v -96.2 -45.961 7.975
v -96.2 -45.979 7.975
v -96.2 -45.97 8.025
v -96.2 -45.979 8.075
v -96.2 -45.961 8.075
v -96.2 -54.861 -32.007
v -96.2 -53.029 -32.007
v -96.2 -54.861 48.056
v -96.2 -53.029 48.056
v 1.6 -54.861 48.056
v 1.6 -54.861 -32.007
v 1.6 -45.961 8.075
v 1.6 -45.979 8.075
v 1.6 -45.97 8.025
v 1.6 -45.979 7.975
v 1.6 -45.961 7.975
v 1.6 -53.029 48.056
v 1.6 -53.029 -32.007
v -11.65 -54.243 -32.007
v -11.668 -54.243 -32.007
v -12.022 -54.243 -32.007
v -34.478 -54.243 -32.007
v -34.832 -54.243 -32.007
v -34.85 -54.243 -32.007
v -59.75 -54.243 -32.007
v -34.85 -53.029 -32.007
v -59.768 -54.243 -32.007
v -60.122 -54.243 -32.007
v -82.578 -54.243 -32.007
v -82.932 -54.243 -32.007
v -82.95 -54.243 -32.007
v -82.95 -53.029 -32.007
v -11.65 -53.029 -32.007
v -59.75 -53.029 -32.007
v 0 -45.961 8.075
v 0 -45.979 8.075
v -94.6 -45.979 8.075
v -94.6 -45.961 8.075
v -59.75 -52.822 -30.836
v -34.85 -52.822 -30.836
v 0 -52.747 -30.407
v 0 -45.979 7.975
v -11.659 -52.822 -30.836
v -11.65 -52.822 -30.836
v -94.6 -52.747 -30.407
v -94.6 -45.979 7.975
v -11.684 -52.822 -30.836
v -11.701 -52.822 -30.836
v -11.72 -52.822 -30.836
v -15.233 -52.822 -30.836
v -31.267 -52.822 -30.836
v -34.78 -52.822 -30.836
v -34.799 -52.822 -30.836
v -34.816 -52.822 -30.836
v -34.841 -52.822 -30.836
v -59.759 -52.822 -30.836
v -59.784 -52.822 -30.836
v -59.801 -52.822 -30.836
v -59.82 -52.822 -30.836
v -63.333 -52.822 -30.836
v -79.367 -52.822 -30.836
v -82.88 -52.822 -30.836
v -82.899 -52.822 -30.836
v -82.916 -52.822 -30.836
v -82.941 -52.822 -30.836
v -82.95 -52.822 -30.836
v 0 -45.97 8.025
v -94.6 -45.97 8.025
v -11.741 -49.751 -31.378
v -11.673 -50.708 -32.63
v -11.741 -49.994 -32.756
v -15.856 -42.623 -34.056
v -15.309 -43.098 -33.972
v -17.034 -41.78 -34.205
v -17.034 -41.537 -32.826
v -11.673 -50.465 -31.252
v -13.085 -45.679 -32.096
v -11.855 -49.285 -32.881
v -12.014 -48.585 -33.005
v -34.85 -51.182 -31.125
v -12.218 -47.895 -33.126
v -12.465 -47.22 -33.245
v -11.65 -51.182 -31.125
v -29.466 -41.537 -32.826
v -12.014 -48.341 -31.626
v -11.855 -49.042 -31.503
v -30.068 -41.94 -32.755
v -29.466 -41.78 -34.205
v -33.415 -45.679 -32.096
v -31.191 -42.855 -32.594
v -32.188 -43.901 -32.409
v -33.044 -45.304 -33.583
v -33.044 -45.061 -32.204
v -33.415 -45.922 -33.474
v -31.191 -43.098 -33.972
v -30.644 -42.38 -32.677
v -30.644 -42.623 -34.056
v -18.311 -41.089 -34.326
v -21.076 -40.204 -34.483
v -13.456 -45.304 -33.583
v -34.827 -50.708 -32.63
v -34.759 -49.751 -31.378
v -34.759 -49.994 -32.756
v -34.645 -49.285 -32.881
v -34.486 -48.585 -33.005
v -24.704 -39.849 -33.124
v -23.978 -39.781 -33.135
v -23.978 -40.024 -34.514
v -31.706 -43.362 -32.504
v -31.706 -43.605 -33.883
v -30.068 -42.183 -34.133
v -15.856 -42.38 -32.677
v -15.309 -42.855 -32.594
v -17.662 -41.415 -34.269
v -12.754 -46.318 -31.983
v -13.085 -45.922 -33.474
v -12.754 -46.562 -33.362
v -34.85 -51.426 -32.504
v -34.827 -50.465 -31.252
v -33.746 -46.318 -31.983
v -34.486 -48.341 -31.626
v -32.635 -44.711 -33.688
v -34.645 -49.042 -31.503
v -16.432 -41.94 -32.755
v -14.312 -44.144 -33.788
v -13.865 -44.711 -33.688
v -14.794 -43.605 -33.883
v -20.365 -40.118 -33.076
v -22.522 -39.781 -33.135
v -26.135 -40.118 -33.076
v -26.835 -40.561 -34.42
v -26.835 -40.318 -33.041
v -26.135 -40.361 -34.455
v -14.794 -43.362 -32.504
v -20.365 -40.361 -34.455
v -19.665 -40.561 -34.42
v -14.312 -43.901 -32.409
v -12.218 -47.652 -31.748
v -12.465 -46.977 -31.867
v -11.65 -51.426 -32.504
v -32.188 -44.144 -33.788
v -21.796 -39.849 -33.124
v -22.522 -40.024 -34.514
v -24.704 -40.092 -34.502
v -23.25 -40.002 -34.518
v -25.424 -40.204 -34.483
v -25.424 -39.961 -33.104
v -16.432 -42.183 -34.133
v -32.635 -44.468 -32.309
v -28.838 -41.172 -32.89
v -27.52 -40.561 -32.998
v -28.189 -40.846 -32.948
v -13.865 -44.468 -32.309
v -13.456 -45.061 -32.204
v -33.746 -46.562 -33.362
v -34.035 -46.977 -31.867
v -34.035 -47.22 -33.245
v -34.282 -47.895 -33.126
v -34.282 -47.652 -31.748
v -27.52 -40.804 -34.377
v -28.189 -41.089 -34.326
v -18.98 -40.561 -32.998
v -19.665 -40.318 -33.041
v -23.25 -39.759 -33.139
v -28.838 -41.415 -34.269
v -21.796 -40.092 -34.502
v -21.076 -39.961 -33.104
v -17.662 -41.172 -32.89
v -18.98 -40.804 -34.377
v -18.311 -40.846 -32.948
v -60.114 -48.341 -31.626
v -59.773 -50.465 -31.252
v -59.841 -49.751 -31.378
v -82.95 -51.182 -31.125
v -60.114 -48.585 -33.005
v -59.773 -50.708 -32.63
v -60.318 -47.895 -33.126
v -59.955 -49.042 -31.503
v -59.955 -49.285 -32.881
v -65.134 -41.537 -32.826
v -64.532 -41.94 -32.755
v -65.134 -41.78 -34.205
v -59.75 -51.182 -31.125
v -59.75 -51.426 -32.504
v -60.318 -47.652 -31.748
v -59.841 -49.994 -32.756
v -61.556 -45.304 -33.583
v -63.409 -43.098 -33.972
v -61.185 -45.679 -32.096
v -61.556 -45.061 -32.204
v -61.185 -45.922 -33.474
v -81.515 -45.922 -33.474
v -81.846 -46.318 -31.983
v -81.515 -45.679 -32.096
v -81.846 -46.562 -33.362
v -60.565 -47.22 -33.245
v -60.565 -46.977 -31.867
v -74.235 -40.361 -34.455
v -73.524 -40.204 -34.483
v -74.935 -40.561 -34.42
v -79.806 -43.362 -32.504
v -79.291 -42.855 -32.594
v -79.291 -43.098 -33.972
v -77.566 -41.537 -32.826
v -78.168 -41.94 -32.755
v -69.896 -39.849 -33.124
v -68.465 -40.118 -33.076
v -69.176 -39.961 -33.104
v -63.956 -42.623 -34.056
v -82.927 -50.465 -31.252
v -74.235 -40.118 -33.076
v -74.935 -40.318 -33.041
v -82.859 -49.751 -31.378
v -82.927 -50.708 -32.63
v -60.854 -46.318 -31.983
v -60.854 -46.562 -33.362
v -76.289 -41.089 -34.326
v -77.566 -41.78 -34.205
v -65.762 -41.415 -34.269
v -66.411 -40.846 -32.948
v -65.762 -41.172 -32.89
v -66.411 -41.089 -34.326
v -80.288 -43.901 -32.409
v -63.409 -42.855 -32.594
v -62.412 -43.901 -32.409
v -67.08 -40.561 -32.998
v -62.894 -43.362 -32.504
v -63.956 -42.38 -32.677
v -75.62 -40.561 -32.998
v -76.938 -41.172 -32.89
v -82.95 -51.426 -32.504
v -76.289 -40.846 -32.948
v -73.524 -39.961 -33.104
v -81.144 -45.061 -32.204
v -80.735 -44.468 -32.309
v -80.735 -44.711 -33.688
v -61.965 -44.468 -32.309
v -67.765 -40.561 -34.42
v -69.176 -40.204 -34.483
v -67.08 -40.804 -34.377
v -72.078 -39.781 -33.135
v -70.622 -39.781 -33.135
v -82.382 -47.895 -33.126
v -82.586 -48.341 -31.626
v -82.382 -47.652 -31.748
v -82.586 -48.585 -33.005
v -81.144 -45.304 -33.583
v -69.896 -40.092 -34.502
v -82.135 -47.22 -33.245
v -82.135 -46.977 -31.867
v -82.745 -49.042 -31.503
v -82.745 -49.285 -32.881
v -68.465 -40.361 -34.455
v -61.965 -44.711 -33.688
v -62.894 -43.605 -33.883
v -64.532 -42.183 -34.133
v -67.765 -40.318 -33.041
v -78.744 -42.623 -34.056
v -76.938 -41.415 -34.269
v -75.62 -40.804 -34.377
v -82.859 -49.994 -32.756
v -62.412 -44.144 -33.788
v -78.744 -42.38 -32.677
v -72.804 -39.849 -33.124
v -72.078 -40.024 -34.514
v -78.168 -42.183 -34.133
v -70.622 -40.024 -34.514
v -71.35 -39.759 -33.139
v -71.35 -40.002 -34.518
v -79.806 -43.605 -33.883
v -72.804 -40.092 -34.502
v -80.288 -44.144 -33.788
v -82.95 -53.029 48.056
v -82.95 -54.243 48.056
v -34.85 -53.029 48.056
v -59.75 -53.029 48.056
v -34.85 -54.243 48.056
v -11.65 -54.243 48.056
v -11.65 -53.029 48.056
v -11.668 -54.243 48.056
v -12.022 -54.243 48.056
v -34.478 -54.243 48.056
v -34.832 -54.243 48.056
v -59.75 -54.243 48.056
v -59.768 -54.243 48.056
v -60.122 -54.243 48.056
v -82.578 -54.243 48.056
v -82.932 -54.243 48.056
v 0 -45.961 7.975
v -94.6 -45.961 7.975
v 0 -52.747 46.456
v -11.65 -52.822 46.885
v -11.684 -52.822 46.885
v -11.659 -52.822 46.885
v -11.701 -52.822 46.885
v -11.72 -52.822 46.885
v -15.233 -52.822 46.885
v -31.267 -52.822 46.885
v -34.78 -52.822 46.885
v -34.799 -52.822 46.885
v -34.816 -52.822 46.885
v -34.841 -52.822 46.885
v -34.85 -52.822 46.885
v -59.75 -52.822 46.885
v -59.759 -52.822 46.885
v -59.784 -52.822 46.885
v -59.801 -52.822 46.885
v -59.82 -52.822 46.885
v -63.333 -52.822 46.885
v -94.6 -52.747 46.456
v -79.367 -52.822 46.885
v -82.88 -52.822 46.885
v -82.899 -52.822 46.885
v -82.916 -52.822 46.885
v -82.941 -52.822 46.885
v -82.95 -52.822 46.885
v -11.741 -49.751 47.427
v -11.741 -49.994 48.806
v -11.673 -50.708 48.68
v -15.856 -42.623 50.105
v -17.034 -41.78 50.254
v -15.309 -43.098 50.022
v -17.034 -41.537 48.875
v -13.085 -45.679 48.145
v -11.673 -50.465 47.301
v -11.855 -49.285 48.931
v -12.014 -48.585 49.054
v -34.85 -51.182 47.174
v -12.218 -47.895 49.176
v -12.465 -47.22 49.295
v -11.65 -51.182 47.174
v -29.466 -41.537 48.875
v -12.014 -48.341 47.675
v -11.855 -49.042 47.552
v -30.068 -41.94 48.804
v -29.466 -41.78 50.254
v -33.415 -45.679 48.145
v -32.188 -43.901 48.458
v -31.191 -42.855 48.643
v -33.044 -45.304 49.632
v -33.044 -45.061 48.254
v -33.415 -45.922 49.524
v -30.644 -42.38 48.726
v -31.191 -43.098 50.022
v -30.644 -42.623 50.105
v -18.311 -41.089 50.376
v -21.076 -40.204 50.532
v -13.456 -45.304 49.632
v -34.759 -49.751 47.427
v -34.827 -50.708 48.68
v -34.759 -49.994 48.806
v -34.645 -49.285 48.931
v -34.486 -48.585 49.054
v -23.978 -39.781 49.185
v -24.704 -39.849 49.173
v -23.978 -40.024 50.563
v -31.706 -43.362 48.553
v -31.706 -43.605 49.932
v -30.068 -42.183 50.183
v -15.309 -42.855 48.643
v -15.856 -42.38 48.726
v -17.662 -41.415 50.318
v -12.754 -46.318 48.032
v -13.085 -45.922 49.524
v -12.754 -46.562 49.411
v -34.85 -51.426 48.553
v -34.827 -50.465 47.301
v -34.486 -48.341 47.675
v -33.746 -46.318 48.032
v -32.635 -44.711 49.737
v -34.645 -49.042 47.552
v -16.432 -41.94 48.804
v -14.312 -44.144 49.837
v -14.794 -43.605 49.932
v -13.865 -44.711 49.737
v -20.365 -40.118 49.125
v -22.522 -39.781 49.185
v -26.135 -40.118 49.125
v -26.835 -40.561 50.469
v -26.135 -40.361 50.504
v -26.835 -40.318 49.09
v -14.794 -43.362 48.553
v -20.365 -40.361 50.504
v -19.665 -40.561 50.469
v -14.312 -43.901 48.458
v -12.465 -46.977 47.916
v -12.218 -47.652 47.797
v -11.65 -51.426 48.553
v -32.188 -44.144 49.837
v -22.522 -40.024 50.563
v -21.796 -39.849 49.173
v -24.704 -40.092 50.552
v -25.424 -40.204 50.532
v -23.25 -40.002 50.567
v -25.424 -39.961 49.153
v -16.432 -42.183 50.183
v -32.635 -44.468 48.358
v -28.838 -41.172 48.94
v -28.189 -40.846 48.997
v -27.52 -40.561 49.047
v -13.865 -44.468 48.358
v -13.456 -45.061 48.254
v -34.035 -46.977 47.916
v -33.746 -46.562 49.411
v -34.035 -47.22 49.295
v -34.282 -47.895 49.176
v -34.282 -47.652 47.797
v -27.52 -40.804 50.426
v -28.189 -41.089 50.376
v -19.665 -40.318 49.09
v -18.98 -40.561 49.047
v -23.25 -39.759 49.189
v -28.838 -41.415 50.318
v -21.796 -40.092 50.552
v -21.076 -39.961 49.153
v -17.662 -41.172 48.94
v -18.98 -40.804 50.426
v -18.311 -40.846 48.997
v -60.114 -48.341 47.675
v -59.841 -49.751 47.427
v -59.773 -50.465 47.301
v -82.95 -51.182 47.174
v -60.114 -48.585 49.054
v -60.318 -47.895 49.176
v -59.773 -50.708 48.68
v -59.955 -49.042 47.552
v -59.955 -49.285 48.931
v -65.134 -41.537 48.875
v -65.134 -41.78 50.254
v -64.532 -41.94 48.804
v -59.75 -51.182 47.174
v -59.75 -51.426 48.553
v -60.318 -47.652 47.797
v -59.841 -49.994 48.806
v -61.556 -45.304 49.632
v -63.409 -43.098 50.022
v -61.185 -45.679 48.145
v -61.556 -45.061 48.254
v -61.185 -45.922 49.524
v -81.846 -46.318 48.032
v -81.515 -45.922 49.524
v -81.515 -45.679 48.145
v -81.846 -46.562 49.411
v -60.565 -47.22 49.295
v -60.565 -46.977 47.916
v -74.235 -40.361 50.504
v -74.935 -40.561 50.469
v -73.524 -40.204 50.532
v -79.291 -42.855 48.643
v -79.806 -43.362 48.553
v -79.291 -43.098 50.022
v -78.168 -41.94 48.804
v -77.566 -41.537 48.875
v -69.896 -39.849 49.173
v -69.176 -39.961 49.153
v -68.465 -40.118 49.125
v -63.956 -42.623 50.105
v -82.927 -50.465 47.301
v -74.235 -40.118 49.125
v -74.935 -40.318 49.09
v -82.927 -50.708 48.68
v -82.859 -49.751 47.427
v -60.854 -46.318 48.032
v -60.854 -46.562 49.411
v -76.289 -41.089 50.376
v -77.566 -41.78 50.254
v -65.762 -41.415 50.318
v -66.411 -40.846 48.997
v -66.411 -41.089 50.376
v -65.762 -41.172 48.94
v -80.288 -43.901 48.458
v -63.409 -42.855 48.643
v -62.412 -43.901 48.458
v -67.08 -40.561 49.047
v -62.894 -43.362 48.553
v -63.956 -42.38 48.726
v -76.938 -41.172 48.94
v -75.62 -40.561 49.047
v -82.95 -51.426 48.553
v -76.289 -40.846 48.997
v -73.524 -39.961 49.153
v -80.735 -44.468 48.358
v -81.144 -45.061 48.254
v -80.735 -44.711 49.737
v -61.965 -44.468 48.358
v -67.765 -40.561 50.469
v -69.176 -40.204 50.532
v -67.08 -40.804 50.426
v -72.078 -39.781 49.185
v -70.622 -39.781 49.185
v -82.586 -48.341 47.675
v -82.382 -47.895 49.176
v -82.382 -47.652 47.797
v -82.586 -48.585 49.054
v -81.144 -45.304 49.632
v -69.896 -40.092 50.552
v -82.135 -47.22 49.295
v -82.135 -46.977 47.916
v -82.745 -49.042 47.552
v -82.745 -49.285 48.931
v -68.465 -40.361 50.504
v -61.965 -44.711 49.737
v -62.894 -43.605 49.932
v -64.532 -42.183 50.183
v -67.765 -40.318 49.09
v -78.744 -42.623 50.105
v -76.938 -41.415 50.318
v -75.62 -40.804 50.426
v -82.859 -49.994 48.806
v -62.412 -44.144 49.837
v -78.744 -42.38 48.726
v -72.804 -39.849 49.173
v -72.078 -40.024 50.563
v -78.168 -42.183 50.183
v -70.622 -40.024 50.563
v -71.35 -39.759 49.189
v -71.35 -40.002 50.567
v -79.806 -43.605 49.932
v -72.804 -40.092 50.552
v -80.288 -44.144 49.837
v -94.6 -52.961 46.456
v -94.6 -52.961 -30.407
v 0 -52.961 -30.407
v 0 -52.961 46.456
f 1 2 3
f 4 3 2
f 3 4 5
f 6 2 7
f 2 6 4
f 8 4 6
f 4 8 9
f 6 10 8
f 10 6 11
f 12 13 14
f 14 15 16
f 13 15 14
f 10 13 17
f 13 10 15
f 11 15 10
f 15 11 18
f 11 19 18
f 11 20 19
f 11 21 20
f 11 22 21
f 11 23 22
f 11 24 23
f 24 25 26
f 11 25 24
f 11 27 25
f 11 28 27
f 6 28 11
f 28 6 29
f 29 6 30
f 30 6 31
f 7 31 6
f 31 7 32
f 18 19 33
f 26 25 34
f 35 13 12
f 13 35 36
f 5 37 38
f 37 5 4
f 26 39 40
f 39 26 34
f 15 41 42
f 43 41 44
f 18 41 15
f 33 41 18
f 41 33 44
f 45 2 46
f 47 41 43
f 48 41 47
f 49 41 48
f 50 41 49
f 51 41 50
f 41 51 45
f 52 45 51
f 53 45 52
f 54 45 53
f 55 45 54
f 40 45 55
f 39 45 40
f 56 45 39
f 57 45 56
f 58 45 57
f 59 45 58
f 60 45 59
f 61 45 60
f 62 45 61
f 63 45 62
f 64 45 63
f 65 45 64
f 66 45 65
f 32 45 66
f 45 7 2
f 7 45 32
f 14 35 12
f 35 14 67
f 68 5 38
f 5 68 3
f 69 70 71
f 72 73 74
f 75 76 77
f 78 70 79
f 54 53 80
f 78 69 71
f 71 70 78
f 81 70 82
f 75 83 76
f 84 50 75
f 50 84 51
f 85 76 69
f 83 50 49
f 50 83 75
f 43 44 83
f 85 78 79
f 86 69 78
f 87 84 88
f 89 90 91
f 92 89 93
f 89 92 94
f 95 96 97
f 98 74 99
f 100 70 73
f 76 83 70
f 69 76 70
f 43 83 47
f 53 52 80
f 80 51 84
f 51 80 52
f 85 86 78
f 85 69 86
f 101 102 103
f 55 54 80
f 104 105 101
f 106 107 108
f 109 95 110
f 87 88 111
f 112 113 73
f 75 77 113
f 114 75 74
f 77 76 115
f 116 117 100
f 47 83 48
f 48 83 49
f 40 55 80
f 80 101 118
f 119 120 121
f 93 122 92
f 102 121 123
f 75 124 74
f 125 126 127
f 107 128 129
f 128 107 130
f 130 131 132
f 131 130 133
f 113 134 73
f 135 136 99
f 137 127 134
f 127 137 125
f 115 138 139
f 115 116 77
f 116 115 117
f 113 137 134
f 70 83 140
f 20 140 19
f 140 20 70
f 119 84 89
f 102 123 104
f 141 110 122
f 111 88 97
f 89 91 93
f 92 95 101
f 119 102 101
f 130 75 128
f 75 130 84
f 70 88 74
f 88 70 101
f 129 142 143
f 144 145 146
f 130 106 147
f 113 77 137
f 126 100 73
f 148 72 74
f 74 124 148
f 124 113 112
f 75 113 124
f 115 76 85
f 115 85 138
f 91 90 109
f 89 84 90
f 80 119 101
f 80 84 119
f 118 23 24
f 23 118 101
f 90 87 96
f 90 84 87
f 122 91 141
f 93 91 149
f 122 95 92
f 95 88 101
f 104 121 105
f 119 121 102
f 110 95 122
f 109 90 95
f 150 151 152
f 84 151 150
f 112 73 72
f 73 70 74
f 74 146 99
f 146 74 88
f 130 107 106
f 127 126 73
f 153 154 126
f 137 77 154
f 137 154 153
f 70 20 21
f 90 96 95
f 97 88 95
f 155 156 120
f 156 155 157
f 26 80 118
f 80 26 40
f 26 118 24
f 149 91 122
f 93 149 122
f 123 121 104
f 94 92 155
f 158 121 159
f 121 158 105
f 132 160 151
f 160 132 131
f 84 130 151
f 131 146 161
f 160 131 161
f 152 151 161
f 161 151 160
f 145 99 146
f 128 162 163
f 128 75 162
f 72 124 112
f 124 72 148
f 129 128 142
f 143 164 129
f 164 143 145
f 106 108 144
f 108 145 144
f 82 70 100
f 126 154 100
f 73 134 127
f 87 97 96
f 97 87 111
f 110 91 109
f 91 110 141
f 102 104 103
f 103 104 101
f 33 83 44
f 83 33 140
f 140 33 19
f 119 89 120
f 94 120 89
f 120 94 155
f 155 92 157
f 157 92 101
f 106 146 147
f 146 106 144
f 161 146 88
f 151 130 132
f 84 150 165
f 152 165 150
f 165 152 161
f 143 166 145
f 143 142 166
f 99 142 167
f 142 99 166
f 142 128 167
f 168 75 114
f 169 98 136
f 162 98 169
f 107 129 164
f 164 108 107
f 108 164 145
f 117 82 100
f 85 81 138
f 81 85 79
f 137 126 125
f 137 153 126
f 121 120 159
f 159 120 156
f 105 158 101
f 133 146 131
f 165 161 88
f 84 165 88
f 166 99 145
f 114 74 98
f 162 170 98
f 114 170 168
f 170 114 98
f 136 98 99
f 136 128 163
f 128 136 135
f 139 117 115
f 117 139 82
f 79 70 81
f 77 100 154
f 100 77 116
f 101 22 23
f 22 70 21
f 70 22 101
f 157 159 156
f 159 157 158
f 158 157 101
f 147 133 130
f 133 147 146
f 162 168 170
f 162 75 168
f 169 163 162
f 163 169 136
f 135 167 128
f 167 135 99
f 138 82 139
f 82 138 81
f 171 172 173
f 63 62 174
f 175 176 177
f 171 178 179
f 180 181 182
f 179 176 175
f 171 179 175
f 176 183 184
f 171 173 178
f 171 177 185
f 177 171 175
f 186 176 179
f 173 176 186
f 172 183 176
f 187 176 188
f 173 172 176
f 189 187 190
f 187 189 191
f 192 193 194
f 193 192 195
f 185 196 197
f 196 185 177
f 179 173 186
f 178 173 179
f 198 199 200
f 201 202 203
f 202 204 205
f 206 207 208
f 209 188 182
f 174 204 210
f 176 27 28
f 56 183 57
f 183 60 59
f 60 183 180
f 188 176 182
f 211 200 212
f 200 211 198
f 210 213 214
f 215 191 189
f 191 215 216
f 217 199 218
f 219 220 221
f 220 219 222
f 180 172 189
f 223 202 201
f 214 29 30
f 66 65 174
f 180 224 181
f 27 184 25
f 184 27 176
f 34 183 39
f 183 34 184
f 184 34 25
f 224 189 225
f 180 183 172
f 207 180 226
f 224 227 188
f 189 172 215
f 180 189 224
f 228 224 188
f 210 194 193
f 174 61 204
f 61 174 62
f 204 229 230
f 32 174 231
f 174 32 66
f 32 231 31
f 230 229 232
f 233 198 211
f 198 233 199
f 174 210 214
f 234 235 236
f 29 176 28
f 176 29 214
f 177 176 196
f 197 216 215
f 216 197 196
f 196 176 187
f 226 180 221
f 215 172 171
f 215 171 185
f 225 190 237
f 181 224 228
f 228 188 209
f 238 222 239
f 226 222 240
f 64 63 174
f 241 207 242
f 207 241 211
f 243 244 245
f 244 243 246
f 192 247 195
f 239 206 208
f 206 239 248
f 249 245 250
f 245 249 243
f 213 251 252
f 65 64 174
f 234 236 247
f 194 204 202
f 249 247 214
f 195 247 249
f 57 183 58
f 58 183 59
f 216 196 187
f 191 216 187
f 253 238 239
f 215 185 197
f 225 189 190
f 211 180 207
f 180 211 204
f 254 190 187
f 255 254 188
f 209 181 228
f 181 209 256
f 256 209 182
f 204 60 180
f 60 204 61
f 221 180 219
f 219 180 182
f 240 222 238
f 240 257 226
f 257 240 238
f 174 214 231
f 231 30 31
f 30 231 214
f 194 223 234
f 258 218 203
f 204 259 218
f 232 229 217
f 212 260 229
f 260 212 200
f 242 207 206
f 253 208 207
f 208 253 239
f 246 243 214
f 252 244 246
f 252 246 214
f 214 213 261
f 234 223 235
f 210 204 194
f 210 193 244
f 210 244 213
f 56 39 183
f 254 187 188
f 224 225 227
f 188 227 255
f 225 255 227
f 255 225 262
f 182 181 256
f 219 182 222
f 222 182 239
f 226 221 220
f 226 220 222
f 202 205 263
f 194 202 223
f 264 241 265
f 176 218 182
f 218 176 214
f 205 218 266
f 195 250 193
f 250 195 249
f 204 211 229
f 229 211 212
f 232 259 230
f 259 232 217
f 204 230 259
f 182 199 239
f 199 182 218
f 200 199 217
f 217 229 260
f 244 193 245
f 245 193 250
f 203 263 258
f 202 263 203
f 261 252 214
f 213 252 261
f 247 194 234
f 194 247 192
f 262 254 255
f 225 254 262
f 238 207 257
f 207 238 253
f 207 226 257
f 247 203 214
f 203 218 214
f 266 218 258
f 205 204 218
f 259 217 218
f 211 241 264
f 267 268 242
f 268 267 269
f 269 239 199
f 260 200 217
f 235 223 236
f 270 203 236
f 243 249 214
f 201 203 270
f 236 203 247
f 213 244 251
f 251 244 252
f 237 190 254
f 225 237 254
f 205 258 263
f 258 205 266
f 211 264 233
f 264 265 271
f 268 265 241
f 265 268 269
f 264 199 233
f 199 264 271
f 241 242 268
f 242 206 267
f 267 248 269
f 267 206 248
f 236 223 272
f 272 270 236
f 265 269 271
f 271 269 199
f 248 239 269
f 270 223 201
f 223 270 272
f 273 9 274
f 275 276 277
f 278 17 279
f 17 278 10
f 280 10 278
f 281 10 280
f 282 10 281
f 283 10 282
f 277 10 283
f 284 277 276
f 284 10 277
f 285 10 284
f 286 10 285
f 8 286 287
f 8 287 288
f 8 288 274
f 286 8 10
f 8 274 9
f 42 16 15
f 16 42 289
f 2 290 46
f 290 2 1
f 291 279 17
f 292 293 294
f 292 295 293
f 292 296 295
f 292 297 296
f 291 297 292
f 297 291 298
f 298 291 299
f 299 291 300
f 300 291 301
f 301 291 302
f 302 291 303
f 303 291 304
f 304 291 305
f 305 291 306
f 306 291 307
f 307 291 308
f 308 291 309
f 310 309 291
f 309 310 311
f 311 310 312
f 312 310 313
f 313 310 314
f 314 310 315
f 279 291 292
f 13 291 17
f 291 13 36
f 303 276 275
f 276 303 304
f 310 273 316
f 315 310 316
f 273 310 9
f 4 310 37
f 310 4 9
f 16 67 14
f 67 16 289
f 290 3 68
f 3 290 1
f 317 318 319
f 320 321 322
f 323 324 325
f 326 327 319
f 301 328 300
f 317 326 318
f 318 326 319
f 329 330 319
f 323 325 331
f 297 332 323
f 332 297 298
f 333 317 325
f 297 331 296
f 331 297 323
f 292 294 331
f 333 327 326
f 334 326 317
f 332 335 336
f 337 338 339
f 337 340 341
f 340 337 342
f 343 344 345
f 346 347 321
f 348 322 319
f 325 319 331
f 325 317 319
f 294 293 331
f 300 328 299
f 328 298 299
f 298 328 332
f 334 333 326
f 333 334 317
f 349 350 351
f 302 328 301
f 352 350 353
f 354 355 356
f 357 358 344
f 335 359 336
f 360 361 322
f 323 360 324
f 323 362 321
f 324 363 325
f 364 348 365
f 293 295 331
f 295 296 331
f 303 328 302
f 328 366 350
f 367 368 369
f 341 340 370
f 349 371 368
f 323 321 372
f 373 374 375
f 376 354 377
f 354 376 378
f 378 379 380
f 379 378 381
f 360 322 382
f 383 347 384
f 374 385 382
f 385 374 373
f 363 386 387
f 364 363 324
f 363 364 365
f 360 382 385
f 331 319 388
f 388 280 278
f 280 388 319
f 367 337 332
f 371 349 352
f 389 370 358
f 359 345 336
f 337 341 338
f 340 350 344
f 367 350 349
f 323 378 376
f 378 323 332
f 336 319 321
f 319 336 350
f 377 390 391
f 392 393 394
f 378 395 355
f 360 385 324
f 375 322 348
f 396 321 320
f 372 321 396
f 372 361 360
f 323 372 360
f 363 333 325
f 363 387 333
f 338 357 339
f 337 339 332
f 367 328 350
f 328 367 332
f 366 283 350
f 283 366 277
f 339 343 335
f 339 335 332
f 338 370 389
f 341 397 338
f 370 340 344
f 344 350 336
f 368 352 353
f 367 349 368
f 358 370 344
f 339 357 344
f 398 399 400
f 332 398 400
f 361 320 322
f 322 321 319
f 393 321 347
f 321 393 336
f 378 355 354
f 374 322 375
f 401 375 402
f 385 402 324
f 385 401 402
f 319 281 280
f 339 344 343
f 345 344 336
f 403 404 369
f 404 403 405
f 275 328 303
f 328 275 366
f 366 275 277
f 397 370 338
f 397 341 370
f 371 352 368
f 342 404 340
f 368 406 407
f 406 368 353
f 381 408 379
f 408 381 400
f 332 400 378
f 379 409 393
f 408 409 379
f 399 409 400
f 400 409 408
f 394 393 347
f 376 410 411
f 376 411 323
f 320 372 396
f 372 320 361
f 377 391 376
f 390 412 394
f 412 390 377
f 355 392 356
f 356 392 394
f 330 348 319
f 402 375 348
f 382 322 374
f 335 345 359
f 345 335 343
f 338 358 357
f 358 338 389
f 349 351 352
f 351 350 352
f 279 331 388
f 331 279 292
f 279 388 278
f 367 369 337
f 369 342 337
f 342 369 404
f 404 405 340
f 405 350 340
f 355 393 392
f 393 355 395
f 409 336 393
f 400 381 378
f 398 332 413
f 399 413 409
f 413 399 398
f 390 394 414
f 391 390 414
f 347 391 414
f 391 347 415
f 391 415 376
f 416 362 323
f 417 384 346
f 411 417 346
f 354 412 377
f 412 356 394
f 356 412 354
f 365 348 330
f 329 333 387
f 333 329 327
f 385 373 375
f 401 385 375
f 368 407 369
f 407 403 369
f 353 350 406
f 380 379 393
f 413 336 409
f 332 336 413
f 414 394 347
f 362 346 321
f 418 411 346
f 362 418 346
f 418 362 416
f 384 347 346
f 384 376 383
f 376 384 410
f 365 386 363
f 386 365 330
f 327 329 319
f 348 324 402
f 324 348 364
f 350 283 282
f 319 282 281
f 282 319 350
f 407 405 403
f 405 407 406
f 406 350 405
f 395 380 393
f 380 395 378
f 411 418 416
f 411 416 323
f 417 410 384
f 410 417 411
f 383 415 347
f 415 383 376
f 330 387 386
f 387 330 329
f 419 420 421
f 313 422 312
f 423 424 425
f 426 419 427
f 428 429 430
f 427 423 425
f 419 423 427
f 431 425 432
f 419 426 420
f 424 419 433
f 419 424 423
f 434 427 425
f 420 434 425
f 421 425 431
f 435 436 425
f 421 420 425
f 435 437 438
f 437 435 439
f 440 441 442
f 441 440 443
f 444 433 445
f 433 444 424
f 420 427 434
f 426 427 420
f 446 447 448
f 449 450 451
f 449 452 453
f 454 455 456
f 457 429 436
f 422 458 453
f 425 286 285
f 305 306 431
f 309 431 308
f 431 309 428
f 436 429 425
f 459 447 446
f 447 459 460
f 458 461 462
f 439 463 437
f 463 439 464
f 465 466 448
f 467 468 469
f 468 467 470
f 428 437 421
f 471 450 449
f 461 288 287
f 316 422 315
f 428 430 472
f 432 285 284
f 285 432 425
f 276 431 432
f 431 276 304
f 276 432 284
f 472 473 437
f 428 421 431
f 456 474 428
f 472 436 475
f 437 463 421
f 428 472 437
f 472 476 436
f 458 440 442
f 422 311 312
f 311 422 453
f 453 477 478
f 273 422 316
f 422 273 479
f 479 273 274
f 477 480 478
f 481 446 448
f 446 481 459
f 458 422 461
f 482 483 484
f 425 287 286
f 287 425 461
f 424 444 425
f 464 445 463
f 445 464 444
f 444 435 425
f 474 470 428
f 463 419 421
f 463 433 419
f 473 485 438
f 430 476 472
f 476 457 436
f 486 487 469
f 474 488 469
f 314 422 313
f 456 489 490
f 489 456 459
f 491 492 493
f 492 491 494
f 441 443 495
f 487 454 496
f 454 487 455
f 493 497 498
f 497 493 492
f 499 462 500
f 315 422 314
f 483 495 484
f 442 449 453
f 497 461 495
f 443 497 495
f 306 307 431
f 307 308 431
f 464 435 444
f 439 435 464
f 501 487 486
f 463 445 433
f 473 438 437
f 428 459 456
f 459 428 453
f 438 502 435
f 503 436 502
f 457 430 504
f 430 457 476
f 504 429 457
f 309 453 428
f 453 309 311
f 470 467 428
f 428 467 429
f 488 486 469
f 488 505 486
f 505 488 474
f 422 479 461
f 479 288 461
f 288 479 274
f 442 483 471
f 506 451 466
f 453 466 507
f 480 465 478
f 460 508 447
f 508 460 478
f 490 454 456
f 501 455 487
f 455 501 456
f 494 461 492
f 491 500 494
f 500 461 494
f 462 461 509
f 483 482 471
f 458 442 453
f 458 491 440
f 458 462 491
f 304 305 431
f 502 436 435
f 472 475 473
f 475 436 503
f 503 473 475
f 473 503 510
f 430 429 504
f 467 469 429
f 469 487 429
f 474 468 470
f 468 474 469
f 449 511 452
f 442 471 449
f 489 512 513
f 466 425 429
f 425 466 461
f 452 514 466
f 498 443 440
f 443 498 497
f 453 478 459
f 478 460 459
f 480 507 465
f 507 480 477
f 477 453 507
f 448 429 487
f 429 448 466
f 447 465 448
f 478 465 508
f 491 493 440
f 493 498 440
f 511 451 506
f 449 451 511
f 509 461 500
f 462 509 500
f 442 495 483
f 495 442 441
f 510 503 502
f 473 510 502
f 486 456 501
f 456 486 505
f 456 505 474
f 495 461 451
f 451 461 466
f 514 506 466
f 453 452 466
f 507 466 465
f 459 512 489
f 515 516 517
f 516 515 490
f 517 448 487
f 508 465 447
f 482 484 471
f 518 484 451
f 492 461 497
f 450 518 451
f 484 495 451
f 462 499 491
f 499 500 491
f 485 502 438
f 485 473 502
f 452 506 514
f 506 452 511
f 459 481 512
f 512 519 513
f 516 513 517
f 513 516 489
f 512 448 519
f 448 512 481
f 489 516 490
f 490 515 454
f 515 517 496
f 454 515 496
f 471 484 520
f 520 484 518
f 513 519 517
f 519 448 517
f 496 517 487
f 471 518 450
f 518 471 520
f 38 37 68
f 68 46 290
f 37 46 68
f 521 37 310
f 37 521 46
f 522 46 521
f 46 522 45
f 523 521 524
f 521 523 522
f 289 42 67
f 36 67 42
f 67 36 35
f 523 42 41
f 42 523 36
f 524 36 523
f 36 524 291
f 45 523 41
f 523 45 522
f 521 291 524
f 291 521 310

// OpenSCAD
// Token width
tokenwidth = 45;
// Token height
tokenheight= 45;
// Token stack depth
tokenstack = 36;
// Number of stacks to create
numstack = 2;
// Create a mirrored line of stacks
doublerev = "yes"; // [yes:yes,no:no]
// Rotation of the stacks
rotation = 10; // [0,1,2,3,4,5,6,7,8,9,10,11,12,13,14,15,16,17,18,19,20,21,22,23,24,25,26,27,28,29,30,31,32,33,34,35,36,37,38,39,40]
// Wall size
wallsize = 1.6;
// Wobble (added to width, height and depth)
wobble = 1.5;
// Size of the holes cutout
fingersize = 24;
// Text you want to add
text = "";
// The font you want to use
font = "Slabo 27px"; // [Slabo 27px,Oswald,Indie Flower,Yanone Kaffeesatz,Titillium Web,Arvo,Lobster,Fjalla One,Bree Serif,Muli,Pacifico,Anton,Maven Pro,Monda,Lobster Two,Bangers,Sigmar One,Courgette,Fugaz One,Patrick Hand,Viga,Fredoka One,Damion,Audiowide,Black Ops One,Montserrat Alternates,Jockey One,Lily Script One]
// Size of the text
textsize = 18;
// Print the box or lid
print = "lid"; // [box:Box,lid:Lid]


$fn = 100;

basex = (tokenwidth+wobble)*numstack+wallsize*numstack+wallsize;
basey = cos(rotation)*(tokenstack+wobble+wallsize*2)+cos(rotation-90)*(tokenheight+wobble);
topy = cos(rotation)*(tokenstack+wobble+wallsize*2);
    
module inline(){
    difference(){
        union(){
             translate([-wallsize,-sin(rotation)*(tokenheight+wobble),-2]) cube([basex, basey, sin(rotation)*(tokenstack+wobble+wallsize*2)+2]);
            translate([-wallsize,0,0]) rotate([rotation,0,0]) cube([basex, tokenstack+wobble+wallsize*2, tokenheight+wobble]);
            translate([-wallsize,-sin(rotation)*(tokenheight+wobble),0]) cube([basex, tokenstack+wobble+wallsize*2, cos(rotation)*(tokenheight+wobble)]);
        }
        for(i = [0:numstack-1]) {
            translate([i*(wallsize+tokenwidth+wobble),wallsize,0]) rotate([rotation,0,0]) cube([tokenwidth+wobble, tokenstack+wobble, tokenheight+wobble+2]);
            hull(){
                rotate([90+rotation,0,0]) translate([(tokenwidth+wobble)/2+(i*(tokenwidth+wobble+wallsize)),tokenheight/2,-tokenstack-wobble-(2.15*wallsize)]) cylinder(d=fingersize,h=wallsize*2);
                rotate([90+rotation,0,0]) translate([(tokenwidth+wobble)/2+(i*(tokenwidth+wobble+wallsize)),tokenheight+wobble,-tokenstack-wobble-(2.15*wallsize)]) cylinder(d=fingersize,h=wallsize*2);
            }
        }
    }
}

module cover(){
    difference(){
        union(){
             //translate([-wallsize,-sin(rotation)*(tokenheight+wobble),-2]) cube([basex, basey, sin(rotation)*(tokenstack+wobble+wallsize*2)+2]);
           difference(){
               translate([-wallsize,-sin(rotation)*(tokenheight+wobble),cos(rotation)*(tokenheight+wobble)]) cube([basex, topy, sin(rotation)*(tokenstack+wobble+wallsize*2)+2]);
            translate([-wallsize-0.1,-0.1,wobble/10]) rotate([rotation,0,0]) cube([basex+0.2, tokenstack+wobble+wallsize*2+0.2, tokenheight+wobble]);
           }
            //translate([-wallsize,-sin(rotation)*(tokenheight+wobble),0]) cube([basex, tokenstack+wobble+wallsize*2, cos(rotation)*(tokenheight+wobble)]);
           
        for(i = [0:numstack-1]) {
            //translate([i*(wallsize+tokenwidth+wobble),wallsize,0]) rotate([rotation,0,0]) cube([tokenwidth+wobble, tokenstack+wobble, tokenheight+wobble+2]);
            difference(){
            hull(){
                rotate([90+rotation,0,0]) translate([(tokenwidth+wobble)/2+(i*(tokenwidth+wobble+wallsize)),tokenheight,-tokenstack-wobble-(2.15*wallsize)]) cylinder(d=fingersize-0.8,h=wallsize-0.2);
                rotate([90+rotation,0,0]) translate([(tokenwidth+wobble)/2+(i*(tokenwidth+wobble+wallsize)),tokenheight+wobble*10,-tokenstack-wobble-(2.15*wallsize)]) cylinder(d=fingersize-0.8,h=wallsize-0.2);
            }
           translate([-wallsize,-sin(rotation)*(tokenheight+wobble),cos(rotation)*(tokenheight+wobble)+sin(rotation)*(tokenstack+wobble+wallsize*2)+2]) cube([basex, topy*1.1, tokenheight+wobble]);
        }
        }
        }

    }
}

if(print == "box"){
if(doublerev == "yes") {
    union(){
        translate([0,0,0]) inline();
    rotate([0,0,90]) translate([-sin(rotation)*(tokenheight+wobble)*2+0.1,0,0]) mirror([1,1,0]){ inline(); };
}
    echo(str("Dimensions are : ", basex, " mm * ", basey*2, "mm"));
} else {
    translate([0,0,0]) inline();
    echo(str("Dimensions are : ", basex, " mm * ", basey, "mm"));
}
}

if(print == "lid"){
if(doublerev == "yes") {
    rotate([-90,0,180]) difference(){
    union(){
        translate([0,0,0]) cover();
    rotate([0,0,90]) translate([-sin(rotation)*(tokenheight+wobble)*2+0.1,0,0]) mirror([1,1,0]){ cover(); };
}
translate([basex/2-wallsize,-sin(rotation)*(tokenheight+wobble),cos(rotation)*(tokenheight+wobble)+sin(rotation)*(tokenstack+wobble+wallsize*2)+1.1]) rotate([0,0,180]) linear_extrude(height = 50, center = false, convexity = 10) text(text,size=textsize,font=font,valign="center",halign="center");
translate([0,-sin(rotation)*(tokenheight+wobble),cos(rotation)*(tokenheight+wobble)-wallsize]) cube([basex-wallsize*2, topy-wallsize, sin(rotation)*(tokenstack+wobble+wallsize*2)+1.7]);

rotate([0,0,90]) translate([-sin(rotation)*(tokenheight+wobble)*2+0.1,0,0]) mirror([1,1,0]) translate([0,-sin(rotation)*(tokenheight+wobble),cos(rotation)*(tokenheight+wobble)-wallsize]) cube([basex-wallsize*2, topy-wallsize, sin(rotation)*(tokenstack+wobble+wallsize*2)+1.7]);
}
    //echo(str("Dimensions are : ", basex, " mm * ", basey*2, "mm"));
} else {
    rotate([-90,0,180]) difference(){
    translate([0,0,0]) cover();
        translate([basex/2-wallsize,-sin(rotation)*(tokenheight+wobble)+topy/2,cos(rotation)*(tokenheight+wobble)+sin(rotation)*(tokenstack+wobble+wallsize*2)+1.1]) rotate([0,0,180]) linear_extrude(height = 50, center = false, convexity = 10) text(text,size=textsize,font=font,valign="center",halign="center");
        translate([0,-sin(rotation)*(tokenheight+wobble)+wallsize,cos(rotation)*(tokenheight+wobble)-wallsize]) cube([basex-wallsize*2, topy-wallsize*2, sin(rotation)*(tokenstack+wobble+wallsize*2)+1.7]);
    }
    //echo(str("Dimensions are : ", basex, " mm * ", basey, "mm"));
}
}
